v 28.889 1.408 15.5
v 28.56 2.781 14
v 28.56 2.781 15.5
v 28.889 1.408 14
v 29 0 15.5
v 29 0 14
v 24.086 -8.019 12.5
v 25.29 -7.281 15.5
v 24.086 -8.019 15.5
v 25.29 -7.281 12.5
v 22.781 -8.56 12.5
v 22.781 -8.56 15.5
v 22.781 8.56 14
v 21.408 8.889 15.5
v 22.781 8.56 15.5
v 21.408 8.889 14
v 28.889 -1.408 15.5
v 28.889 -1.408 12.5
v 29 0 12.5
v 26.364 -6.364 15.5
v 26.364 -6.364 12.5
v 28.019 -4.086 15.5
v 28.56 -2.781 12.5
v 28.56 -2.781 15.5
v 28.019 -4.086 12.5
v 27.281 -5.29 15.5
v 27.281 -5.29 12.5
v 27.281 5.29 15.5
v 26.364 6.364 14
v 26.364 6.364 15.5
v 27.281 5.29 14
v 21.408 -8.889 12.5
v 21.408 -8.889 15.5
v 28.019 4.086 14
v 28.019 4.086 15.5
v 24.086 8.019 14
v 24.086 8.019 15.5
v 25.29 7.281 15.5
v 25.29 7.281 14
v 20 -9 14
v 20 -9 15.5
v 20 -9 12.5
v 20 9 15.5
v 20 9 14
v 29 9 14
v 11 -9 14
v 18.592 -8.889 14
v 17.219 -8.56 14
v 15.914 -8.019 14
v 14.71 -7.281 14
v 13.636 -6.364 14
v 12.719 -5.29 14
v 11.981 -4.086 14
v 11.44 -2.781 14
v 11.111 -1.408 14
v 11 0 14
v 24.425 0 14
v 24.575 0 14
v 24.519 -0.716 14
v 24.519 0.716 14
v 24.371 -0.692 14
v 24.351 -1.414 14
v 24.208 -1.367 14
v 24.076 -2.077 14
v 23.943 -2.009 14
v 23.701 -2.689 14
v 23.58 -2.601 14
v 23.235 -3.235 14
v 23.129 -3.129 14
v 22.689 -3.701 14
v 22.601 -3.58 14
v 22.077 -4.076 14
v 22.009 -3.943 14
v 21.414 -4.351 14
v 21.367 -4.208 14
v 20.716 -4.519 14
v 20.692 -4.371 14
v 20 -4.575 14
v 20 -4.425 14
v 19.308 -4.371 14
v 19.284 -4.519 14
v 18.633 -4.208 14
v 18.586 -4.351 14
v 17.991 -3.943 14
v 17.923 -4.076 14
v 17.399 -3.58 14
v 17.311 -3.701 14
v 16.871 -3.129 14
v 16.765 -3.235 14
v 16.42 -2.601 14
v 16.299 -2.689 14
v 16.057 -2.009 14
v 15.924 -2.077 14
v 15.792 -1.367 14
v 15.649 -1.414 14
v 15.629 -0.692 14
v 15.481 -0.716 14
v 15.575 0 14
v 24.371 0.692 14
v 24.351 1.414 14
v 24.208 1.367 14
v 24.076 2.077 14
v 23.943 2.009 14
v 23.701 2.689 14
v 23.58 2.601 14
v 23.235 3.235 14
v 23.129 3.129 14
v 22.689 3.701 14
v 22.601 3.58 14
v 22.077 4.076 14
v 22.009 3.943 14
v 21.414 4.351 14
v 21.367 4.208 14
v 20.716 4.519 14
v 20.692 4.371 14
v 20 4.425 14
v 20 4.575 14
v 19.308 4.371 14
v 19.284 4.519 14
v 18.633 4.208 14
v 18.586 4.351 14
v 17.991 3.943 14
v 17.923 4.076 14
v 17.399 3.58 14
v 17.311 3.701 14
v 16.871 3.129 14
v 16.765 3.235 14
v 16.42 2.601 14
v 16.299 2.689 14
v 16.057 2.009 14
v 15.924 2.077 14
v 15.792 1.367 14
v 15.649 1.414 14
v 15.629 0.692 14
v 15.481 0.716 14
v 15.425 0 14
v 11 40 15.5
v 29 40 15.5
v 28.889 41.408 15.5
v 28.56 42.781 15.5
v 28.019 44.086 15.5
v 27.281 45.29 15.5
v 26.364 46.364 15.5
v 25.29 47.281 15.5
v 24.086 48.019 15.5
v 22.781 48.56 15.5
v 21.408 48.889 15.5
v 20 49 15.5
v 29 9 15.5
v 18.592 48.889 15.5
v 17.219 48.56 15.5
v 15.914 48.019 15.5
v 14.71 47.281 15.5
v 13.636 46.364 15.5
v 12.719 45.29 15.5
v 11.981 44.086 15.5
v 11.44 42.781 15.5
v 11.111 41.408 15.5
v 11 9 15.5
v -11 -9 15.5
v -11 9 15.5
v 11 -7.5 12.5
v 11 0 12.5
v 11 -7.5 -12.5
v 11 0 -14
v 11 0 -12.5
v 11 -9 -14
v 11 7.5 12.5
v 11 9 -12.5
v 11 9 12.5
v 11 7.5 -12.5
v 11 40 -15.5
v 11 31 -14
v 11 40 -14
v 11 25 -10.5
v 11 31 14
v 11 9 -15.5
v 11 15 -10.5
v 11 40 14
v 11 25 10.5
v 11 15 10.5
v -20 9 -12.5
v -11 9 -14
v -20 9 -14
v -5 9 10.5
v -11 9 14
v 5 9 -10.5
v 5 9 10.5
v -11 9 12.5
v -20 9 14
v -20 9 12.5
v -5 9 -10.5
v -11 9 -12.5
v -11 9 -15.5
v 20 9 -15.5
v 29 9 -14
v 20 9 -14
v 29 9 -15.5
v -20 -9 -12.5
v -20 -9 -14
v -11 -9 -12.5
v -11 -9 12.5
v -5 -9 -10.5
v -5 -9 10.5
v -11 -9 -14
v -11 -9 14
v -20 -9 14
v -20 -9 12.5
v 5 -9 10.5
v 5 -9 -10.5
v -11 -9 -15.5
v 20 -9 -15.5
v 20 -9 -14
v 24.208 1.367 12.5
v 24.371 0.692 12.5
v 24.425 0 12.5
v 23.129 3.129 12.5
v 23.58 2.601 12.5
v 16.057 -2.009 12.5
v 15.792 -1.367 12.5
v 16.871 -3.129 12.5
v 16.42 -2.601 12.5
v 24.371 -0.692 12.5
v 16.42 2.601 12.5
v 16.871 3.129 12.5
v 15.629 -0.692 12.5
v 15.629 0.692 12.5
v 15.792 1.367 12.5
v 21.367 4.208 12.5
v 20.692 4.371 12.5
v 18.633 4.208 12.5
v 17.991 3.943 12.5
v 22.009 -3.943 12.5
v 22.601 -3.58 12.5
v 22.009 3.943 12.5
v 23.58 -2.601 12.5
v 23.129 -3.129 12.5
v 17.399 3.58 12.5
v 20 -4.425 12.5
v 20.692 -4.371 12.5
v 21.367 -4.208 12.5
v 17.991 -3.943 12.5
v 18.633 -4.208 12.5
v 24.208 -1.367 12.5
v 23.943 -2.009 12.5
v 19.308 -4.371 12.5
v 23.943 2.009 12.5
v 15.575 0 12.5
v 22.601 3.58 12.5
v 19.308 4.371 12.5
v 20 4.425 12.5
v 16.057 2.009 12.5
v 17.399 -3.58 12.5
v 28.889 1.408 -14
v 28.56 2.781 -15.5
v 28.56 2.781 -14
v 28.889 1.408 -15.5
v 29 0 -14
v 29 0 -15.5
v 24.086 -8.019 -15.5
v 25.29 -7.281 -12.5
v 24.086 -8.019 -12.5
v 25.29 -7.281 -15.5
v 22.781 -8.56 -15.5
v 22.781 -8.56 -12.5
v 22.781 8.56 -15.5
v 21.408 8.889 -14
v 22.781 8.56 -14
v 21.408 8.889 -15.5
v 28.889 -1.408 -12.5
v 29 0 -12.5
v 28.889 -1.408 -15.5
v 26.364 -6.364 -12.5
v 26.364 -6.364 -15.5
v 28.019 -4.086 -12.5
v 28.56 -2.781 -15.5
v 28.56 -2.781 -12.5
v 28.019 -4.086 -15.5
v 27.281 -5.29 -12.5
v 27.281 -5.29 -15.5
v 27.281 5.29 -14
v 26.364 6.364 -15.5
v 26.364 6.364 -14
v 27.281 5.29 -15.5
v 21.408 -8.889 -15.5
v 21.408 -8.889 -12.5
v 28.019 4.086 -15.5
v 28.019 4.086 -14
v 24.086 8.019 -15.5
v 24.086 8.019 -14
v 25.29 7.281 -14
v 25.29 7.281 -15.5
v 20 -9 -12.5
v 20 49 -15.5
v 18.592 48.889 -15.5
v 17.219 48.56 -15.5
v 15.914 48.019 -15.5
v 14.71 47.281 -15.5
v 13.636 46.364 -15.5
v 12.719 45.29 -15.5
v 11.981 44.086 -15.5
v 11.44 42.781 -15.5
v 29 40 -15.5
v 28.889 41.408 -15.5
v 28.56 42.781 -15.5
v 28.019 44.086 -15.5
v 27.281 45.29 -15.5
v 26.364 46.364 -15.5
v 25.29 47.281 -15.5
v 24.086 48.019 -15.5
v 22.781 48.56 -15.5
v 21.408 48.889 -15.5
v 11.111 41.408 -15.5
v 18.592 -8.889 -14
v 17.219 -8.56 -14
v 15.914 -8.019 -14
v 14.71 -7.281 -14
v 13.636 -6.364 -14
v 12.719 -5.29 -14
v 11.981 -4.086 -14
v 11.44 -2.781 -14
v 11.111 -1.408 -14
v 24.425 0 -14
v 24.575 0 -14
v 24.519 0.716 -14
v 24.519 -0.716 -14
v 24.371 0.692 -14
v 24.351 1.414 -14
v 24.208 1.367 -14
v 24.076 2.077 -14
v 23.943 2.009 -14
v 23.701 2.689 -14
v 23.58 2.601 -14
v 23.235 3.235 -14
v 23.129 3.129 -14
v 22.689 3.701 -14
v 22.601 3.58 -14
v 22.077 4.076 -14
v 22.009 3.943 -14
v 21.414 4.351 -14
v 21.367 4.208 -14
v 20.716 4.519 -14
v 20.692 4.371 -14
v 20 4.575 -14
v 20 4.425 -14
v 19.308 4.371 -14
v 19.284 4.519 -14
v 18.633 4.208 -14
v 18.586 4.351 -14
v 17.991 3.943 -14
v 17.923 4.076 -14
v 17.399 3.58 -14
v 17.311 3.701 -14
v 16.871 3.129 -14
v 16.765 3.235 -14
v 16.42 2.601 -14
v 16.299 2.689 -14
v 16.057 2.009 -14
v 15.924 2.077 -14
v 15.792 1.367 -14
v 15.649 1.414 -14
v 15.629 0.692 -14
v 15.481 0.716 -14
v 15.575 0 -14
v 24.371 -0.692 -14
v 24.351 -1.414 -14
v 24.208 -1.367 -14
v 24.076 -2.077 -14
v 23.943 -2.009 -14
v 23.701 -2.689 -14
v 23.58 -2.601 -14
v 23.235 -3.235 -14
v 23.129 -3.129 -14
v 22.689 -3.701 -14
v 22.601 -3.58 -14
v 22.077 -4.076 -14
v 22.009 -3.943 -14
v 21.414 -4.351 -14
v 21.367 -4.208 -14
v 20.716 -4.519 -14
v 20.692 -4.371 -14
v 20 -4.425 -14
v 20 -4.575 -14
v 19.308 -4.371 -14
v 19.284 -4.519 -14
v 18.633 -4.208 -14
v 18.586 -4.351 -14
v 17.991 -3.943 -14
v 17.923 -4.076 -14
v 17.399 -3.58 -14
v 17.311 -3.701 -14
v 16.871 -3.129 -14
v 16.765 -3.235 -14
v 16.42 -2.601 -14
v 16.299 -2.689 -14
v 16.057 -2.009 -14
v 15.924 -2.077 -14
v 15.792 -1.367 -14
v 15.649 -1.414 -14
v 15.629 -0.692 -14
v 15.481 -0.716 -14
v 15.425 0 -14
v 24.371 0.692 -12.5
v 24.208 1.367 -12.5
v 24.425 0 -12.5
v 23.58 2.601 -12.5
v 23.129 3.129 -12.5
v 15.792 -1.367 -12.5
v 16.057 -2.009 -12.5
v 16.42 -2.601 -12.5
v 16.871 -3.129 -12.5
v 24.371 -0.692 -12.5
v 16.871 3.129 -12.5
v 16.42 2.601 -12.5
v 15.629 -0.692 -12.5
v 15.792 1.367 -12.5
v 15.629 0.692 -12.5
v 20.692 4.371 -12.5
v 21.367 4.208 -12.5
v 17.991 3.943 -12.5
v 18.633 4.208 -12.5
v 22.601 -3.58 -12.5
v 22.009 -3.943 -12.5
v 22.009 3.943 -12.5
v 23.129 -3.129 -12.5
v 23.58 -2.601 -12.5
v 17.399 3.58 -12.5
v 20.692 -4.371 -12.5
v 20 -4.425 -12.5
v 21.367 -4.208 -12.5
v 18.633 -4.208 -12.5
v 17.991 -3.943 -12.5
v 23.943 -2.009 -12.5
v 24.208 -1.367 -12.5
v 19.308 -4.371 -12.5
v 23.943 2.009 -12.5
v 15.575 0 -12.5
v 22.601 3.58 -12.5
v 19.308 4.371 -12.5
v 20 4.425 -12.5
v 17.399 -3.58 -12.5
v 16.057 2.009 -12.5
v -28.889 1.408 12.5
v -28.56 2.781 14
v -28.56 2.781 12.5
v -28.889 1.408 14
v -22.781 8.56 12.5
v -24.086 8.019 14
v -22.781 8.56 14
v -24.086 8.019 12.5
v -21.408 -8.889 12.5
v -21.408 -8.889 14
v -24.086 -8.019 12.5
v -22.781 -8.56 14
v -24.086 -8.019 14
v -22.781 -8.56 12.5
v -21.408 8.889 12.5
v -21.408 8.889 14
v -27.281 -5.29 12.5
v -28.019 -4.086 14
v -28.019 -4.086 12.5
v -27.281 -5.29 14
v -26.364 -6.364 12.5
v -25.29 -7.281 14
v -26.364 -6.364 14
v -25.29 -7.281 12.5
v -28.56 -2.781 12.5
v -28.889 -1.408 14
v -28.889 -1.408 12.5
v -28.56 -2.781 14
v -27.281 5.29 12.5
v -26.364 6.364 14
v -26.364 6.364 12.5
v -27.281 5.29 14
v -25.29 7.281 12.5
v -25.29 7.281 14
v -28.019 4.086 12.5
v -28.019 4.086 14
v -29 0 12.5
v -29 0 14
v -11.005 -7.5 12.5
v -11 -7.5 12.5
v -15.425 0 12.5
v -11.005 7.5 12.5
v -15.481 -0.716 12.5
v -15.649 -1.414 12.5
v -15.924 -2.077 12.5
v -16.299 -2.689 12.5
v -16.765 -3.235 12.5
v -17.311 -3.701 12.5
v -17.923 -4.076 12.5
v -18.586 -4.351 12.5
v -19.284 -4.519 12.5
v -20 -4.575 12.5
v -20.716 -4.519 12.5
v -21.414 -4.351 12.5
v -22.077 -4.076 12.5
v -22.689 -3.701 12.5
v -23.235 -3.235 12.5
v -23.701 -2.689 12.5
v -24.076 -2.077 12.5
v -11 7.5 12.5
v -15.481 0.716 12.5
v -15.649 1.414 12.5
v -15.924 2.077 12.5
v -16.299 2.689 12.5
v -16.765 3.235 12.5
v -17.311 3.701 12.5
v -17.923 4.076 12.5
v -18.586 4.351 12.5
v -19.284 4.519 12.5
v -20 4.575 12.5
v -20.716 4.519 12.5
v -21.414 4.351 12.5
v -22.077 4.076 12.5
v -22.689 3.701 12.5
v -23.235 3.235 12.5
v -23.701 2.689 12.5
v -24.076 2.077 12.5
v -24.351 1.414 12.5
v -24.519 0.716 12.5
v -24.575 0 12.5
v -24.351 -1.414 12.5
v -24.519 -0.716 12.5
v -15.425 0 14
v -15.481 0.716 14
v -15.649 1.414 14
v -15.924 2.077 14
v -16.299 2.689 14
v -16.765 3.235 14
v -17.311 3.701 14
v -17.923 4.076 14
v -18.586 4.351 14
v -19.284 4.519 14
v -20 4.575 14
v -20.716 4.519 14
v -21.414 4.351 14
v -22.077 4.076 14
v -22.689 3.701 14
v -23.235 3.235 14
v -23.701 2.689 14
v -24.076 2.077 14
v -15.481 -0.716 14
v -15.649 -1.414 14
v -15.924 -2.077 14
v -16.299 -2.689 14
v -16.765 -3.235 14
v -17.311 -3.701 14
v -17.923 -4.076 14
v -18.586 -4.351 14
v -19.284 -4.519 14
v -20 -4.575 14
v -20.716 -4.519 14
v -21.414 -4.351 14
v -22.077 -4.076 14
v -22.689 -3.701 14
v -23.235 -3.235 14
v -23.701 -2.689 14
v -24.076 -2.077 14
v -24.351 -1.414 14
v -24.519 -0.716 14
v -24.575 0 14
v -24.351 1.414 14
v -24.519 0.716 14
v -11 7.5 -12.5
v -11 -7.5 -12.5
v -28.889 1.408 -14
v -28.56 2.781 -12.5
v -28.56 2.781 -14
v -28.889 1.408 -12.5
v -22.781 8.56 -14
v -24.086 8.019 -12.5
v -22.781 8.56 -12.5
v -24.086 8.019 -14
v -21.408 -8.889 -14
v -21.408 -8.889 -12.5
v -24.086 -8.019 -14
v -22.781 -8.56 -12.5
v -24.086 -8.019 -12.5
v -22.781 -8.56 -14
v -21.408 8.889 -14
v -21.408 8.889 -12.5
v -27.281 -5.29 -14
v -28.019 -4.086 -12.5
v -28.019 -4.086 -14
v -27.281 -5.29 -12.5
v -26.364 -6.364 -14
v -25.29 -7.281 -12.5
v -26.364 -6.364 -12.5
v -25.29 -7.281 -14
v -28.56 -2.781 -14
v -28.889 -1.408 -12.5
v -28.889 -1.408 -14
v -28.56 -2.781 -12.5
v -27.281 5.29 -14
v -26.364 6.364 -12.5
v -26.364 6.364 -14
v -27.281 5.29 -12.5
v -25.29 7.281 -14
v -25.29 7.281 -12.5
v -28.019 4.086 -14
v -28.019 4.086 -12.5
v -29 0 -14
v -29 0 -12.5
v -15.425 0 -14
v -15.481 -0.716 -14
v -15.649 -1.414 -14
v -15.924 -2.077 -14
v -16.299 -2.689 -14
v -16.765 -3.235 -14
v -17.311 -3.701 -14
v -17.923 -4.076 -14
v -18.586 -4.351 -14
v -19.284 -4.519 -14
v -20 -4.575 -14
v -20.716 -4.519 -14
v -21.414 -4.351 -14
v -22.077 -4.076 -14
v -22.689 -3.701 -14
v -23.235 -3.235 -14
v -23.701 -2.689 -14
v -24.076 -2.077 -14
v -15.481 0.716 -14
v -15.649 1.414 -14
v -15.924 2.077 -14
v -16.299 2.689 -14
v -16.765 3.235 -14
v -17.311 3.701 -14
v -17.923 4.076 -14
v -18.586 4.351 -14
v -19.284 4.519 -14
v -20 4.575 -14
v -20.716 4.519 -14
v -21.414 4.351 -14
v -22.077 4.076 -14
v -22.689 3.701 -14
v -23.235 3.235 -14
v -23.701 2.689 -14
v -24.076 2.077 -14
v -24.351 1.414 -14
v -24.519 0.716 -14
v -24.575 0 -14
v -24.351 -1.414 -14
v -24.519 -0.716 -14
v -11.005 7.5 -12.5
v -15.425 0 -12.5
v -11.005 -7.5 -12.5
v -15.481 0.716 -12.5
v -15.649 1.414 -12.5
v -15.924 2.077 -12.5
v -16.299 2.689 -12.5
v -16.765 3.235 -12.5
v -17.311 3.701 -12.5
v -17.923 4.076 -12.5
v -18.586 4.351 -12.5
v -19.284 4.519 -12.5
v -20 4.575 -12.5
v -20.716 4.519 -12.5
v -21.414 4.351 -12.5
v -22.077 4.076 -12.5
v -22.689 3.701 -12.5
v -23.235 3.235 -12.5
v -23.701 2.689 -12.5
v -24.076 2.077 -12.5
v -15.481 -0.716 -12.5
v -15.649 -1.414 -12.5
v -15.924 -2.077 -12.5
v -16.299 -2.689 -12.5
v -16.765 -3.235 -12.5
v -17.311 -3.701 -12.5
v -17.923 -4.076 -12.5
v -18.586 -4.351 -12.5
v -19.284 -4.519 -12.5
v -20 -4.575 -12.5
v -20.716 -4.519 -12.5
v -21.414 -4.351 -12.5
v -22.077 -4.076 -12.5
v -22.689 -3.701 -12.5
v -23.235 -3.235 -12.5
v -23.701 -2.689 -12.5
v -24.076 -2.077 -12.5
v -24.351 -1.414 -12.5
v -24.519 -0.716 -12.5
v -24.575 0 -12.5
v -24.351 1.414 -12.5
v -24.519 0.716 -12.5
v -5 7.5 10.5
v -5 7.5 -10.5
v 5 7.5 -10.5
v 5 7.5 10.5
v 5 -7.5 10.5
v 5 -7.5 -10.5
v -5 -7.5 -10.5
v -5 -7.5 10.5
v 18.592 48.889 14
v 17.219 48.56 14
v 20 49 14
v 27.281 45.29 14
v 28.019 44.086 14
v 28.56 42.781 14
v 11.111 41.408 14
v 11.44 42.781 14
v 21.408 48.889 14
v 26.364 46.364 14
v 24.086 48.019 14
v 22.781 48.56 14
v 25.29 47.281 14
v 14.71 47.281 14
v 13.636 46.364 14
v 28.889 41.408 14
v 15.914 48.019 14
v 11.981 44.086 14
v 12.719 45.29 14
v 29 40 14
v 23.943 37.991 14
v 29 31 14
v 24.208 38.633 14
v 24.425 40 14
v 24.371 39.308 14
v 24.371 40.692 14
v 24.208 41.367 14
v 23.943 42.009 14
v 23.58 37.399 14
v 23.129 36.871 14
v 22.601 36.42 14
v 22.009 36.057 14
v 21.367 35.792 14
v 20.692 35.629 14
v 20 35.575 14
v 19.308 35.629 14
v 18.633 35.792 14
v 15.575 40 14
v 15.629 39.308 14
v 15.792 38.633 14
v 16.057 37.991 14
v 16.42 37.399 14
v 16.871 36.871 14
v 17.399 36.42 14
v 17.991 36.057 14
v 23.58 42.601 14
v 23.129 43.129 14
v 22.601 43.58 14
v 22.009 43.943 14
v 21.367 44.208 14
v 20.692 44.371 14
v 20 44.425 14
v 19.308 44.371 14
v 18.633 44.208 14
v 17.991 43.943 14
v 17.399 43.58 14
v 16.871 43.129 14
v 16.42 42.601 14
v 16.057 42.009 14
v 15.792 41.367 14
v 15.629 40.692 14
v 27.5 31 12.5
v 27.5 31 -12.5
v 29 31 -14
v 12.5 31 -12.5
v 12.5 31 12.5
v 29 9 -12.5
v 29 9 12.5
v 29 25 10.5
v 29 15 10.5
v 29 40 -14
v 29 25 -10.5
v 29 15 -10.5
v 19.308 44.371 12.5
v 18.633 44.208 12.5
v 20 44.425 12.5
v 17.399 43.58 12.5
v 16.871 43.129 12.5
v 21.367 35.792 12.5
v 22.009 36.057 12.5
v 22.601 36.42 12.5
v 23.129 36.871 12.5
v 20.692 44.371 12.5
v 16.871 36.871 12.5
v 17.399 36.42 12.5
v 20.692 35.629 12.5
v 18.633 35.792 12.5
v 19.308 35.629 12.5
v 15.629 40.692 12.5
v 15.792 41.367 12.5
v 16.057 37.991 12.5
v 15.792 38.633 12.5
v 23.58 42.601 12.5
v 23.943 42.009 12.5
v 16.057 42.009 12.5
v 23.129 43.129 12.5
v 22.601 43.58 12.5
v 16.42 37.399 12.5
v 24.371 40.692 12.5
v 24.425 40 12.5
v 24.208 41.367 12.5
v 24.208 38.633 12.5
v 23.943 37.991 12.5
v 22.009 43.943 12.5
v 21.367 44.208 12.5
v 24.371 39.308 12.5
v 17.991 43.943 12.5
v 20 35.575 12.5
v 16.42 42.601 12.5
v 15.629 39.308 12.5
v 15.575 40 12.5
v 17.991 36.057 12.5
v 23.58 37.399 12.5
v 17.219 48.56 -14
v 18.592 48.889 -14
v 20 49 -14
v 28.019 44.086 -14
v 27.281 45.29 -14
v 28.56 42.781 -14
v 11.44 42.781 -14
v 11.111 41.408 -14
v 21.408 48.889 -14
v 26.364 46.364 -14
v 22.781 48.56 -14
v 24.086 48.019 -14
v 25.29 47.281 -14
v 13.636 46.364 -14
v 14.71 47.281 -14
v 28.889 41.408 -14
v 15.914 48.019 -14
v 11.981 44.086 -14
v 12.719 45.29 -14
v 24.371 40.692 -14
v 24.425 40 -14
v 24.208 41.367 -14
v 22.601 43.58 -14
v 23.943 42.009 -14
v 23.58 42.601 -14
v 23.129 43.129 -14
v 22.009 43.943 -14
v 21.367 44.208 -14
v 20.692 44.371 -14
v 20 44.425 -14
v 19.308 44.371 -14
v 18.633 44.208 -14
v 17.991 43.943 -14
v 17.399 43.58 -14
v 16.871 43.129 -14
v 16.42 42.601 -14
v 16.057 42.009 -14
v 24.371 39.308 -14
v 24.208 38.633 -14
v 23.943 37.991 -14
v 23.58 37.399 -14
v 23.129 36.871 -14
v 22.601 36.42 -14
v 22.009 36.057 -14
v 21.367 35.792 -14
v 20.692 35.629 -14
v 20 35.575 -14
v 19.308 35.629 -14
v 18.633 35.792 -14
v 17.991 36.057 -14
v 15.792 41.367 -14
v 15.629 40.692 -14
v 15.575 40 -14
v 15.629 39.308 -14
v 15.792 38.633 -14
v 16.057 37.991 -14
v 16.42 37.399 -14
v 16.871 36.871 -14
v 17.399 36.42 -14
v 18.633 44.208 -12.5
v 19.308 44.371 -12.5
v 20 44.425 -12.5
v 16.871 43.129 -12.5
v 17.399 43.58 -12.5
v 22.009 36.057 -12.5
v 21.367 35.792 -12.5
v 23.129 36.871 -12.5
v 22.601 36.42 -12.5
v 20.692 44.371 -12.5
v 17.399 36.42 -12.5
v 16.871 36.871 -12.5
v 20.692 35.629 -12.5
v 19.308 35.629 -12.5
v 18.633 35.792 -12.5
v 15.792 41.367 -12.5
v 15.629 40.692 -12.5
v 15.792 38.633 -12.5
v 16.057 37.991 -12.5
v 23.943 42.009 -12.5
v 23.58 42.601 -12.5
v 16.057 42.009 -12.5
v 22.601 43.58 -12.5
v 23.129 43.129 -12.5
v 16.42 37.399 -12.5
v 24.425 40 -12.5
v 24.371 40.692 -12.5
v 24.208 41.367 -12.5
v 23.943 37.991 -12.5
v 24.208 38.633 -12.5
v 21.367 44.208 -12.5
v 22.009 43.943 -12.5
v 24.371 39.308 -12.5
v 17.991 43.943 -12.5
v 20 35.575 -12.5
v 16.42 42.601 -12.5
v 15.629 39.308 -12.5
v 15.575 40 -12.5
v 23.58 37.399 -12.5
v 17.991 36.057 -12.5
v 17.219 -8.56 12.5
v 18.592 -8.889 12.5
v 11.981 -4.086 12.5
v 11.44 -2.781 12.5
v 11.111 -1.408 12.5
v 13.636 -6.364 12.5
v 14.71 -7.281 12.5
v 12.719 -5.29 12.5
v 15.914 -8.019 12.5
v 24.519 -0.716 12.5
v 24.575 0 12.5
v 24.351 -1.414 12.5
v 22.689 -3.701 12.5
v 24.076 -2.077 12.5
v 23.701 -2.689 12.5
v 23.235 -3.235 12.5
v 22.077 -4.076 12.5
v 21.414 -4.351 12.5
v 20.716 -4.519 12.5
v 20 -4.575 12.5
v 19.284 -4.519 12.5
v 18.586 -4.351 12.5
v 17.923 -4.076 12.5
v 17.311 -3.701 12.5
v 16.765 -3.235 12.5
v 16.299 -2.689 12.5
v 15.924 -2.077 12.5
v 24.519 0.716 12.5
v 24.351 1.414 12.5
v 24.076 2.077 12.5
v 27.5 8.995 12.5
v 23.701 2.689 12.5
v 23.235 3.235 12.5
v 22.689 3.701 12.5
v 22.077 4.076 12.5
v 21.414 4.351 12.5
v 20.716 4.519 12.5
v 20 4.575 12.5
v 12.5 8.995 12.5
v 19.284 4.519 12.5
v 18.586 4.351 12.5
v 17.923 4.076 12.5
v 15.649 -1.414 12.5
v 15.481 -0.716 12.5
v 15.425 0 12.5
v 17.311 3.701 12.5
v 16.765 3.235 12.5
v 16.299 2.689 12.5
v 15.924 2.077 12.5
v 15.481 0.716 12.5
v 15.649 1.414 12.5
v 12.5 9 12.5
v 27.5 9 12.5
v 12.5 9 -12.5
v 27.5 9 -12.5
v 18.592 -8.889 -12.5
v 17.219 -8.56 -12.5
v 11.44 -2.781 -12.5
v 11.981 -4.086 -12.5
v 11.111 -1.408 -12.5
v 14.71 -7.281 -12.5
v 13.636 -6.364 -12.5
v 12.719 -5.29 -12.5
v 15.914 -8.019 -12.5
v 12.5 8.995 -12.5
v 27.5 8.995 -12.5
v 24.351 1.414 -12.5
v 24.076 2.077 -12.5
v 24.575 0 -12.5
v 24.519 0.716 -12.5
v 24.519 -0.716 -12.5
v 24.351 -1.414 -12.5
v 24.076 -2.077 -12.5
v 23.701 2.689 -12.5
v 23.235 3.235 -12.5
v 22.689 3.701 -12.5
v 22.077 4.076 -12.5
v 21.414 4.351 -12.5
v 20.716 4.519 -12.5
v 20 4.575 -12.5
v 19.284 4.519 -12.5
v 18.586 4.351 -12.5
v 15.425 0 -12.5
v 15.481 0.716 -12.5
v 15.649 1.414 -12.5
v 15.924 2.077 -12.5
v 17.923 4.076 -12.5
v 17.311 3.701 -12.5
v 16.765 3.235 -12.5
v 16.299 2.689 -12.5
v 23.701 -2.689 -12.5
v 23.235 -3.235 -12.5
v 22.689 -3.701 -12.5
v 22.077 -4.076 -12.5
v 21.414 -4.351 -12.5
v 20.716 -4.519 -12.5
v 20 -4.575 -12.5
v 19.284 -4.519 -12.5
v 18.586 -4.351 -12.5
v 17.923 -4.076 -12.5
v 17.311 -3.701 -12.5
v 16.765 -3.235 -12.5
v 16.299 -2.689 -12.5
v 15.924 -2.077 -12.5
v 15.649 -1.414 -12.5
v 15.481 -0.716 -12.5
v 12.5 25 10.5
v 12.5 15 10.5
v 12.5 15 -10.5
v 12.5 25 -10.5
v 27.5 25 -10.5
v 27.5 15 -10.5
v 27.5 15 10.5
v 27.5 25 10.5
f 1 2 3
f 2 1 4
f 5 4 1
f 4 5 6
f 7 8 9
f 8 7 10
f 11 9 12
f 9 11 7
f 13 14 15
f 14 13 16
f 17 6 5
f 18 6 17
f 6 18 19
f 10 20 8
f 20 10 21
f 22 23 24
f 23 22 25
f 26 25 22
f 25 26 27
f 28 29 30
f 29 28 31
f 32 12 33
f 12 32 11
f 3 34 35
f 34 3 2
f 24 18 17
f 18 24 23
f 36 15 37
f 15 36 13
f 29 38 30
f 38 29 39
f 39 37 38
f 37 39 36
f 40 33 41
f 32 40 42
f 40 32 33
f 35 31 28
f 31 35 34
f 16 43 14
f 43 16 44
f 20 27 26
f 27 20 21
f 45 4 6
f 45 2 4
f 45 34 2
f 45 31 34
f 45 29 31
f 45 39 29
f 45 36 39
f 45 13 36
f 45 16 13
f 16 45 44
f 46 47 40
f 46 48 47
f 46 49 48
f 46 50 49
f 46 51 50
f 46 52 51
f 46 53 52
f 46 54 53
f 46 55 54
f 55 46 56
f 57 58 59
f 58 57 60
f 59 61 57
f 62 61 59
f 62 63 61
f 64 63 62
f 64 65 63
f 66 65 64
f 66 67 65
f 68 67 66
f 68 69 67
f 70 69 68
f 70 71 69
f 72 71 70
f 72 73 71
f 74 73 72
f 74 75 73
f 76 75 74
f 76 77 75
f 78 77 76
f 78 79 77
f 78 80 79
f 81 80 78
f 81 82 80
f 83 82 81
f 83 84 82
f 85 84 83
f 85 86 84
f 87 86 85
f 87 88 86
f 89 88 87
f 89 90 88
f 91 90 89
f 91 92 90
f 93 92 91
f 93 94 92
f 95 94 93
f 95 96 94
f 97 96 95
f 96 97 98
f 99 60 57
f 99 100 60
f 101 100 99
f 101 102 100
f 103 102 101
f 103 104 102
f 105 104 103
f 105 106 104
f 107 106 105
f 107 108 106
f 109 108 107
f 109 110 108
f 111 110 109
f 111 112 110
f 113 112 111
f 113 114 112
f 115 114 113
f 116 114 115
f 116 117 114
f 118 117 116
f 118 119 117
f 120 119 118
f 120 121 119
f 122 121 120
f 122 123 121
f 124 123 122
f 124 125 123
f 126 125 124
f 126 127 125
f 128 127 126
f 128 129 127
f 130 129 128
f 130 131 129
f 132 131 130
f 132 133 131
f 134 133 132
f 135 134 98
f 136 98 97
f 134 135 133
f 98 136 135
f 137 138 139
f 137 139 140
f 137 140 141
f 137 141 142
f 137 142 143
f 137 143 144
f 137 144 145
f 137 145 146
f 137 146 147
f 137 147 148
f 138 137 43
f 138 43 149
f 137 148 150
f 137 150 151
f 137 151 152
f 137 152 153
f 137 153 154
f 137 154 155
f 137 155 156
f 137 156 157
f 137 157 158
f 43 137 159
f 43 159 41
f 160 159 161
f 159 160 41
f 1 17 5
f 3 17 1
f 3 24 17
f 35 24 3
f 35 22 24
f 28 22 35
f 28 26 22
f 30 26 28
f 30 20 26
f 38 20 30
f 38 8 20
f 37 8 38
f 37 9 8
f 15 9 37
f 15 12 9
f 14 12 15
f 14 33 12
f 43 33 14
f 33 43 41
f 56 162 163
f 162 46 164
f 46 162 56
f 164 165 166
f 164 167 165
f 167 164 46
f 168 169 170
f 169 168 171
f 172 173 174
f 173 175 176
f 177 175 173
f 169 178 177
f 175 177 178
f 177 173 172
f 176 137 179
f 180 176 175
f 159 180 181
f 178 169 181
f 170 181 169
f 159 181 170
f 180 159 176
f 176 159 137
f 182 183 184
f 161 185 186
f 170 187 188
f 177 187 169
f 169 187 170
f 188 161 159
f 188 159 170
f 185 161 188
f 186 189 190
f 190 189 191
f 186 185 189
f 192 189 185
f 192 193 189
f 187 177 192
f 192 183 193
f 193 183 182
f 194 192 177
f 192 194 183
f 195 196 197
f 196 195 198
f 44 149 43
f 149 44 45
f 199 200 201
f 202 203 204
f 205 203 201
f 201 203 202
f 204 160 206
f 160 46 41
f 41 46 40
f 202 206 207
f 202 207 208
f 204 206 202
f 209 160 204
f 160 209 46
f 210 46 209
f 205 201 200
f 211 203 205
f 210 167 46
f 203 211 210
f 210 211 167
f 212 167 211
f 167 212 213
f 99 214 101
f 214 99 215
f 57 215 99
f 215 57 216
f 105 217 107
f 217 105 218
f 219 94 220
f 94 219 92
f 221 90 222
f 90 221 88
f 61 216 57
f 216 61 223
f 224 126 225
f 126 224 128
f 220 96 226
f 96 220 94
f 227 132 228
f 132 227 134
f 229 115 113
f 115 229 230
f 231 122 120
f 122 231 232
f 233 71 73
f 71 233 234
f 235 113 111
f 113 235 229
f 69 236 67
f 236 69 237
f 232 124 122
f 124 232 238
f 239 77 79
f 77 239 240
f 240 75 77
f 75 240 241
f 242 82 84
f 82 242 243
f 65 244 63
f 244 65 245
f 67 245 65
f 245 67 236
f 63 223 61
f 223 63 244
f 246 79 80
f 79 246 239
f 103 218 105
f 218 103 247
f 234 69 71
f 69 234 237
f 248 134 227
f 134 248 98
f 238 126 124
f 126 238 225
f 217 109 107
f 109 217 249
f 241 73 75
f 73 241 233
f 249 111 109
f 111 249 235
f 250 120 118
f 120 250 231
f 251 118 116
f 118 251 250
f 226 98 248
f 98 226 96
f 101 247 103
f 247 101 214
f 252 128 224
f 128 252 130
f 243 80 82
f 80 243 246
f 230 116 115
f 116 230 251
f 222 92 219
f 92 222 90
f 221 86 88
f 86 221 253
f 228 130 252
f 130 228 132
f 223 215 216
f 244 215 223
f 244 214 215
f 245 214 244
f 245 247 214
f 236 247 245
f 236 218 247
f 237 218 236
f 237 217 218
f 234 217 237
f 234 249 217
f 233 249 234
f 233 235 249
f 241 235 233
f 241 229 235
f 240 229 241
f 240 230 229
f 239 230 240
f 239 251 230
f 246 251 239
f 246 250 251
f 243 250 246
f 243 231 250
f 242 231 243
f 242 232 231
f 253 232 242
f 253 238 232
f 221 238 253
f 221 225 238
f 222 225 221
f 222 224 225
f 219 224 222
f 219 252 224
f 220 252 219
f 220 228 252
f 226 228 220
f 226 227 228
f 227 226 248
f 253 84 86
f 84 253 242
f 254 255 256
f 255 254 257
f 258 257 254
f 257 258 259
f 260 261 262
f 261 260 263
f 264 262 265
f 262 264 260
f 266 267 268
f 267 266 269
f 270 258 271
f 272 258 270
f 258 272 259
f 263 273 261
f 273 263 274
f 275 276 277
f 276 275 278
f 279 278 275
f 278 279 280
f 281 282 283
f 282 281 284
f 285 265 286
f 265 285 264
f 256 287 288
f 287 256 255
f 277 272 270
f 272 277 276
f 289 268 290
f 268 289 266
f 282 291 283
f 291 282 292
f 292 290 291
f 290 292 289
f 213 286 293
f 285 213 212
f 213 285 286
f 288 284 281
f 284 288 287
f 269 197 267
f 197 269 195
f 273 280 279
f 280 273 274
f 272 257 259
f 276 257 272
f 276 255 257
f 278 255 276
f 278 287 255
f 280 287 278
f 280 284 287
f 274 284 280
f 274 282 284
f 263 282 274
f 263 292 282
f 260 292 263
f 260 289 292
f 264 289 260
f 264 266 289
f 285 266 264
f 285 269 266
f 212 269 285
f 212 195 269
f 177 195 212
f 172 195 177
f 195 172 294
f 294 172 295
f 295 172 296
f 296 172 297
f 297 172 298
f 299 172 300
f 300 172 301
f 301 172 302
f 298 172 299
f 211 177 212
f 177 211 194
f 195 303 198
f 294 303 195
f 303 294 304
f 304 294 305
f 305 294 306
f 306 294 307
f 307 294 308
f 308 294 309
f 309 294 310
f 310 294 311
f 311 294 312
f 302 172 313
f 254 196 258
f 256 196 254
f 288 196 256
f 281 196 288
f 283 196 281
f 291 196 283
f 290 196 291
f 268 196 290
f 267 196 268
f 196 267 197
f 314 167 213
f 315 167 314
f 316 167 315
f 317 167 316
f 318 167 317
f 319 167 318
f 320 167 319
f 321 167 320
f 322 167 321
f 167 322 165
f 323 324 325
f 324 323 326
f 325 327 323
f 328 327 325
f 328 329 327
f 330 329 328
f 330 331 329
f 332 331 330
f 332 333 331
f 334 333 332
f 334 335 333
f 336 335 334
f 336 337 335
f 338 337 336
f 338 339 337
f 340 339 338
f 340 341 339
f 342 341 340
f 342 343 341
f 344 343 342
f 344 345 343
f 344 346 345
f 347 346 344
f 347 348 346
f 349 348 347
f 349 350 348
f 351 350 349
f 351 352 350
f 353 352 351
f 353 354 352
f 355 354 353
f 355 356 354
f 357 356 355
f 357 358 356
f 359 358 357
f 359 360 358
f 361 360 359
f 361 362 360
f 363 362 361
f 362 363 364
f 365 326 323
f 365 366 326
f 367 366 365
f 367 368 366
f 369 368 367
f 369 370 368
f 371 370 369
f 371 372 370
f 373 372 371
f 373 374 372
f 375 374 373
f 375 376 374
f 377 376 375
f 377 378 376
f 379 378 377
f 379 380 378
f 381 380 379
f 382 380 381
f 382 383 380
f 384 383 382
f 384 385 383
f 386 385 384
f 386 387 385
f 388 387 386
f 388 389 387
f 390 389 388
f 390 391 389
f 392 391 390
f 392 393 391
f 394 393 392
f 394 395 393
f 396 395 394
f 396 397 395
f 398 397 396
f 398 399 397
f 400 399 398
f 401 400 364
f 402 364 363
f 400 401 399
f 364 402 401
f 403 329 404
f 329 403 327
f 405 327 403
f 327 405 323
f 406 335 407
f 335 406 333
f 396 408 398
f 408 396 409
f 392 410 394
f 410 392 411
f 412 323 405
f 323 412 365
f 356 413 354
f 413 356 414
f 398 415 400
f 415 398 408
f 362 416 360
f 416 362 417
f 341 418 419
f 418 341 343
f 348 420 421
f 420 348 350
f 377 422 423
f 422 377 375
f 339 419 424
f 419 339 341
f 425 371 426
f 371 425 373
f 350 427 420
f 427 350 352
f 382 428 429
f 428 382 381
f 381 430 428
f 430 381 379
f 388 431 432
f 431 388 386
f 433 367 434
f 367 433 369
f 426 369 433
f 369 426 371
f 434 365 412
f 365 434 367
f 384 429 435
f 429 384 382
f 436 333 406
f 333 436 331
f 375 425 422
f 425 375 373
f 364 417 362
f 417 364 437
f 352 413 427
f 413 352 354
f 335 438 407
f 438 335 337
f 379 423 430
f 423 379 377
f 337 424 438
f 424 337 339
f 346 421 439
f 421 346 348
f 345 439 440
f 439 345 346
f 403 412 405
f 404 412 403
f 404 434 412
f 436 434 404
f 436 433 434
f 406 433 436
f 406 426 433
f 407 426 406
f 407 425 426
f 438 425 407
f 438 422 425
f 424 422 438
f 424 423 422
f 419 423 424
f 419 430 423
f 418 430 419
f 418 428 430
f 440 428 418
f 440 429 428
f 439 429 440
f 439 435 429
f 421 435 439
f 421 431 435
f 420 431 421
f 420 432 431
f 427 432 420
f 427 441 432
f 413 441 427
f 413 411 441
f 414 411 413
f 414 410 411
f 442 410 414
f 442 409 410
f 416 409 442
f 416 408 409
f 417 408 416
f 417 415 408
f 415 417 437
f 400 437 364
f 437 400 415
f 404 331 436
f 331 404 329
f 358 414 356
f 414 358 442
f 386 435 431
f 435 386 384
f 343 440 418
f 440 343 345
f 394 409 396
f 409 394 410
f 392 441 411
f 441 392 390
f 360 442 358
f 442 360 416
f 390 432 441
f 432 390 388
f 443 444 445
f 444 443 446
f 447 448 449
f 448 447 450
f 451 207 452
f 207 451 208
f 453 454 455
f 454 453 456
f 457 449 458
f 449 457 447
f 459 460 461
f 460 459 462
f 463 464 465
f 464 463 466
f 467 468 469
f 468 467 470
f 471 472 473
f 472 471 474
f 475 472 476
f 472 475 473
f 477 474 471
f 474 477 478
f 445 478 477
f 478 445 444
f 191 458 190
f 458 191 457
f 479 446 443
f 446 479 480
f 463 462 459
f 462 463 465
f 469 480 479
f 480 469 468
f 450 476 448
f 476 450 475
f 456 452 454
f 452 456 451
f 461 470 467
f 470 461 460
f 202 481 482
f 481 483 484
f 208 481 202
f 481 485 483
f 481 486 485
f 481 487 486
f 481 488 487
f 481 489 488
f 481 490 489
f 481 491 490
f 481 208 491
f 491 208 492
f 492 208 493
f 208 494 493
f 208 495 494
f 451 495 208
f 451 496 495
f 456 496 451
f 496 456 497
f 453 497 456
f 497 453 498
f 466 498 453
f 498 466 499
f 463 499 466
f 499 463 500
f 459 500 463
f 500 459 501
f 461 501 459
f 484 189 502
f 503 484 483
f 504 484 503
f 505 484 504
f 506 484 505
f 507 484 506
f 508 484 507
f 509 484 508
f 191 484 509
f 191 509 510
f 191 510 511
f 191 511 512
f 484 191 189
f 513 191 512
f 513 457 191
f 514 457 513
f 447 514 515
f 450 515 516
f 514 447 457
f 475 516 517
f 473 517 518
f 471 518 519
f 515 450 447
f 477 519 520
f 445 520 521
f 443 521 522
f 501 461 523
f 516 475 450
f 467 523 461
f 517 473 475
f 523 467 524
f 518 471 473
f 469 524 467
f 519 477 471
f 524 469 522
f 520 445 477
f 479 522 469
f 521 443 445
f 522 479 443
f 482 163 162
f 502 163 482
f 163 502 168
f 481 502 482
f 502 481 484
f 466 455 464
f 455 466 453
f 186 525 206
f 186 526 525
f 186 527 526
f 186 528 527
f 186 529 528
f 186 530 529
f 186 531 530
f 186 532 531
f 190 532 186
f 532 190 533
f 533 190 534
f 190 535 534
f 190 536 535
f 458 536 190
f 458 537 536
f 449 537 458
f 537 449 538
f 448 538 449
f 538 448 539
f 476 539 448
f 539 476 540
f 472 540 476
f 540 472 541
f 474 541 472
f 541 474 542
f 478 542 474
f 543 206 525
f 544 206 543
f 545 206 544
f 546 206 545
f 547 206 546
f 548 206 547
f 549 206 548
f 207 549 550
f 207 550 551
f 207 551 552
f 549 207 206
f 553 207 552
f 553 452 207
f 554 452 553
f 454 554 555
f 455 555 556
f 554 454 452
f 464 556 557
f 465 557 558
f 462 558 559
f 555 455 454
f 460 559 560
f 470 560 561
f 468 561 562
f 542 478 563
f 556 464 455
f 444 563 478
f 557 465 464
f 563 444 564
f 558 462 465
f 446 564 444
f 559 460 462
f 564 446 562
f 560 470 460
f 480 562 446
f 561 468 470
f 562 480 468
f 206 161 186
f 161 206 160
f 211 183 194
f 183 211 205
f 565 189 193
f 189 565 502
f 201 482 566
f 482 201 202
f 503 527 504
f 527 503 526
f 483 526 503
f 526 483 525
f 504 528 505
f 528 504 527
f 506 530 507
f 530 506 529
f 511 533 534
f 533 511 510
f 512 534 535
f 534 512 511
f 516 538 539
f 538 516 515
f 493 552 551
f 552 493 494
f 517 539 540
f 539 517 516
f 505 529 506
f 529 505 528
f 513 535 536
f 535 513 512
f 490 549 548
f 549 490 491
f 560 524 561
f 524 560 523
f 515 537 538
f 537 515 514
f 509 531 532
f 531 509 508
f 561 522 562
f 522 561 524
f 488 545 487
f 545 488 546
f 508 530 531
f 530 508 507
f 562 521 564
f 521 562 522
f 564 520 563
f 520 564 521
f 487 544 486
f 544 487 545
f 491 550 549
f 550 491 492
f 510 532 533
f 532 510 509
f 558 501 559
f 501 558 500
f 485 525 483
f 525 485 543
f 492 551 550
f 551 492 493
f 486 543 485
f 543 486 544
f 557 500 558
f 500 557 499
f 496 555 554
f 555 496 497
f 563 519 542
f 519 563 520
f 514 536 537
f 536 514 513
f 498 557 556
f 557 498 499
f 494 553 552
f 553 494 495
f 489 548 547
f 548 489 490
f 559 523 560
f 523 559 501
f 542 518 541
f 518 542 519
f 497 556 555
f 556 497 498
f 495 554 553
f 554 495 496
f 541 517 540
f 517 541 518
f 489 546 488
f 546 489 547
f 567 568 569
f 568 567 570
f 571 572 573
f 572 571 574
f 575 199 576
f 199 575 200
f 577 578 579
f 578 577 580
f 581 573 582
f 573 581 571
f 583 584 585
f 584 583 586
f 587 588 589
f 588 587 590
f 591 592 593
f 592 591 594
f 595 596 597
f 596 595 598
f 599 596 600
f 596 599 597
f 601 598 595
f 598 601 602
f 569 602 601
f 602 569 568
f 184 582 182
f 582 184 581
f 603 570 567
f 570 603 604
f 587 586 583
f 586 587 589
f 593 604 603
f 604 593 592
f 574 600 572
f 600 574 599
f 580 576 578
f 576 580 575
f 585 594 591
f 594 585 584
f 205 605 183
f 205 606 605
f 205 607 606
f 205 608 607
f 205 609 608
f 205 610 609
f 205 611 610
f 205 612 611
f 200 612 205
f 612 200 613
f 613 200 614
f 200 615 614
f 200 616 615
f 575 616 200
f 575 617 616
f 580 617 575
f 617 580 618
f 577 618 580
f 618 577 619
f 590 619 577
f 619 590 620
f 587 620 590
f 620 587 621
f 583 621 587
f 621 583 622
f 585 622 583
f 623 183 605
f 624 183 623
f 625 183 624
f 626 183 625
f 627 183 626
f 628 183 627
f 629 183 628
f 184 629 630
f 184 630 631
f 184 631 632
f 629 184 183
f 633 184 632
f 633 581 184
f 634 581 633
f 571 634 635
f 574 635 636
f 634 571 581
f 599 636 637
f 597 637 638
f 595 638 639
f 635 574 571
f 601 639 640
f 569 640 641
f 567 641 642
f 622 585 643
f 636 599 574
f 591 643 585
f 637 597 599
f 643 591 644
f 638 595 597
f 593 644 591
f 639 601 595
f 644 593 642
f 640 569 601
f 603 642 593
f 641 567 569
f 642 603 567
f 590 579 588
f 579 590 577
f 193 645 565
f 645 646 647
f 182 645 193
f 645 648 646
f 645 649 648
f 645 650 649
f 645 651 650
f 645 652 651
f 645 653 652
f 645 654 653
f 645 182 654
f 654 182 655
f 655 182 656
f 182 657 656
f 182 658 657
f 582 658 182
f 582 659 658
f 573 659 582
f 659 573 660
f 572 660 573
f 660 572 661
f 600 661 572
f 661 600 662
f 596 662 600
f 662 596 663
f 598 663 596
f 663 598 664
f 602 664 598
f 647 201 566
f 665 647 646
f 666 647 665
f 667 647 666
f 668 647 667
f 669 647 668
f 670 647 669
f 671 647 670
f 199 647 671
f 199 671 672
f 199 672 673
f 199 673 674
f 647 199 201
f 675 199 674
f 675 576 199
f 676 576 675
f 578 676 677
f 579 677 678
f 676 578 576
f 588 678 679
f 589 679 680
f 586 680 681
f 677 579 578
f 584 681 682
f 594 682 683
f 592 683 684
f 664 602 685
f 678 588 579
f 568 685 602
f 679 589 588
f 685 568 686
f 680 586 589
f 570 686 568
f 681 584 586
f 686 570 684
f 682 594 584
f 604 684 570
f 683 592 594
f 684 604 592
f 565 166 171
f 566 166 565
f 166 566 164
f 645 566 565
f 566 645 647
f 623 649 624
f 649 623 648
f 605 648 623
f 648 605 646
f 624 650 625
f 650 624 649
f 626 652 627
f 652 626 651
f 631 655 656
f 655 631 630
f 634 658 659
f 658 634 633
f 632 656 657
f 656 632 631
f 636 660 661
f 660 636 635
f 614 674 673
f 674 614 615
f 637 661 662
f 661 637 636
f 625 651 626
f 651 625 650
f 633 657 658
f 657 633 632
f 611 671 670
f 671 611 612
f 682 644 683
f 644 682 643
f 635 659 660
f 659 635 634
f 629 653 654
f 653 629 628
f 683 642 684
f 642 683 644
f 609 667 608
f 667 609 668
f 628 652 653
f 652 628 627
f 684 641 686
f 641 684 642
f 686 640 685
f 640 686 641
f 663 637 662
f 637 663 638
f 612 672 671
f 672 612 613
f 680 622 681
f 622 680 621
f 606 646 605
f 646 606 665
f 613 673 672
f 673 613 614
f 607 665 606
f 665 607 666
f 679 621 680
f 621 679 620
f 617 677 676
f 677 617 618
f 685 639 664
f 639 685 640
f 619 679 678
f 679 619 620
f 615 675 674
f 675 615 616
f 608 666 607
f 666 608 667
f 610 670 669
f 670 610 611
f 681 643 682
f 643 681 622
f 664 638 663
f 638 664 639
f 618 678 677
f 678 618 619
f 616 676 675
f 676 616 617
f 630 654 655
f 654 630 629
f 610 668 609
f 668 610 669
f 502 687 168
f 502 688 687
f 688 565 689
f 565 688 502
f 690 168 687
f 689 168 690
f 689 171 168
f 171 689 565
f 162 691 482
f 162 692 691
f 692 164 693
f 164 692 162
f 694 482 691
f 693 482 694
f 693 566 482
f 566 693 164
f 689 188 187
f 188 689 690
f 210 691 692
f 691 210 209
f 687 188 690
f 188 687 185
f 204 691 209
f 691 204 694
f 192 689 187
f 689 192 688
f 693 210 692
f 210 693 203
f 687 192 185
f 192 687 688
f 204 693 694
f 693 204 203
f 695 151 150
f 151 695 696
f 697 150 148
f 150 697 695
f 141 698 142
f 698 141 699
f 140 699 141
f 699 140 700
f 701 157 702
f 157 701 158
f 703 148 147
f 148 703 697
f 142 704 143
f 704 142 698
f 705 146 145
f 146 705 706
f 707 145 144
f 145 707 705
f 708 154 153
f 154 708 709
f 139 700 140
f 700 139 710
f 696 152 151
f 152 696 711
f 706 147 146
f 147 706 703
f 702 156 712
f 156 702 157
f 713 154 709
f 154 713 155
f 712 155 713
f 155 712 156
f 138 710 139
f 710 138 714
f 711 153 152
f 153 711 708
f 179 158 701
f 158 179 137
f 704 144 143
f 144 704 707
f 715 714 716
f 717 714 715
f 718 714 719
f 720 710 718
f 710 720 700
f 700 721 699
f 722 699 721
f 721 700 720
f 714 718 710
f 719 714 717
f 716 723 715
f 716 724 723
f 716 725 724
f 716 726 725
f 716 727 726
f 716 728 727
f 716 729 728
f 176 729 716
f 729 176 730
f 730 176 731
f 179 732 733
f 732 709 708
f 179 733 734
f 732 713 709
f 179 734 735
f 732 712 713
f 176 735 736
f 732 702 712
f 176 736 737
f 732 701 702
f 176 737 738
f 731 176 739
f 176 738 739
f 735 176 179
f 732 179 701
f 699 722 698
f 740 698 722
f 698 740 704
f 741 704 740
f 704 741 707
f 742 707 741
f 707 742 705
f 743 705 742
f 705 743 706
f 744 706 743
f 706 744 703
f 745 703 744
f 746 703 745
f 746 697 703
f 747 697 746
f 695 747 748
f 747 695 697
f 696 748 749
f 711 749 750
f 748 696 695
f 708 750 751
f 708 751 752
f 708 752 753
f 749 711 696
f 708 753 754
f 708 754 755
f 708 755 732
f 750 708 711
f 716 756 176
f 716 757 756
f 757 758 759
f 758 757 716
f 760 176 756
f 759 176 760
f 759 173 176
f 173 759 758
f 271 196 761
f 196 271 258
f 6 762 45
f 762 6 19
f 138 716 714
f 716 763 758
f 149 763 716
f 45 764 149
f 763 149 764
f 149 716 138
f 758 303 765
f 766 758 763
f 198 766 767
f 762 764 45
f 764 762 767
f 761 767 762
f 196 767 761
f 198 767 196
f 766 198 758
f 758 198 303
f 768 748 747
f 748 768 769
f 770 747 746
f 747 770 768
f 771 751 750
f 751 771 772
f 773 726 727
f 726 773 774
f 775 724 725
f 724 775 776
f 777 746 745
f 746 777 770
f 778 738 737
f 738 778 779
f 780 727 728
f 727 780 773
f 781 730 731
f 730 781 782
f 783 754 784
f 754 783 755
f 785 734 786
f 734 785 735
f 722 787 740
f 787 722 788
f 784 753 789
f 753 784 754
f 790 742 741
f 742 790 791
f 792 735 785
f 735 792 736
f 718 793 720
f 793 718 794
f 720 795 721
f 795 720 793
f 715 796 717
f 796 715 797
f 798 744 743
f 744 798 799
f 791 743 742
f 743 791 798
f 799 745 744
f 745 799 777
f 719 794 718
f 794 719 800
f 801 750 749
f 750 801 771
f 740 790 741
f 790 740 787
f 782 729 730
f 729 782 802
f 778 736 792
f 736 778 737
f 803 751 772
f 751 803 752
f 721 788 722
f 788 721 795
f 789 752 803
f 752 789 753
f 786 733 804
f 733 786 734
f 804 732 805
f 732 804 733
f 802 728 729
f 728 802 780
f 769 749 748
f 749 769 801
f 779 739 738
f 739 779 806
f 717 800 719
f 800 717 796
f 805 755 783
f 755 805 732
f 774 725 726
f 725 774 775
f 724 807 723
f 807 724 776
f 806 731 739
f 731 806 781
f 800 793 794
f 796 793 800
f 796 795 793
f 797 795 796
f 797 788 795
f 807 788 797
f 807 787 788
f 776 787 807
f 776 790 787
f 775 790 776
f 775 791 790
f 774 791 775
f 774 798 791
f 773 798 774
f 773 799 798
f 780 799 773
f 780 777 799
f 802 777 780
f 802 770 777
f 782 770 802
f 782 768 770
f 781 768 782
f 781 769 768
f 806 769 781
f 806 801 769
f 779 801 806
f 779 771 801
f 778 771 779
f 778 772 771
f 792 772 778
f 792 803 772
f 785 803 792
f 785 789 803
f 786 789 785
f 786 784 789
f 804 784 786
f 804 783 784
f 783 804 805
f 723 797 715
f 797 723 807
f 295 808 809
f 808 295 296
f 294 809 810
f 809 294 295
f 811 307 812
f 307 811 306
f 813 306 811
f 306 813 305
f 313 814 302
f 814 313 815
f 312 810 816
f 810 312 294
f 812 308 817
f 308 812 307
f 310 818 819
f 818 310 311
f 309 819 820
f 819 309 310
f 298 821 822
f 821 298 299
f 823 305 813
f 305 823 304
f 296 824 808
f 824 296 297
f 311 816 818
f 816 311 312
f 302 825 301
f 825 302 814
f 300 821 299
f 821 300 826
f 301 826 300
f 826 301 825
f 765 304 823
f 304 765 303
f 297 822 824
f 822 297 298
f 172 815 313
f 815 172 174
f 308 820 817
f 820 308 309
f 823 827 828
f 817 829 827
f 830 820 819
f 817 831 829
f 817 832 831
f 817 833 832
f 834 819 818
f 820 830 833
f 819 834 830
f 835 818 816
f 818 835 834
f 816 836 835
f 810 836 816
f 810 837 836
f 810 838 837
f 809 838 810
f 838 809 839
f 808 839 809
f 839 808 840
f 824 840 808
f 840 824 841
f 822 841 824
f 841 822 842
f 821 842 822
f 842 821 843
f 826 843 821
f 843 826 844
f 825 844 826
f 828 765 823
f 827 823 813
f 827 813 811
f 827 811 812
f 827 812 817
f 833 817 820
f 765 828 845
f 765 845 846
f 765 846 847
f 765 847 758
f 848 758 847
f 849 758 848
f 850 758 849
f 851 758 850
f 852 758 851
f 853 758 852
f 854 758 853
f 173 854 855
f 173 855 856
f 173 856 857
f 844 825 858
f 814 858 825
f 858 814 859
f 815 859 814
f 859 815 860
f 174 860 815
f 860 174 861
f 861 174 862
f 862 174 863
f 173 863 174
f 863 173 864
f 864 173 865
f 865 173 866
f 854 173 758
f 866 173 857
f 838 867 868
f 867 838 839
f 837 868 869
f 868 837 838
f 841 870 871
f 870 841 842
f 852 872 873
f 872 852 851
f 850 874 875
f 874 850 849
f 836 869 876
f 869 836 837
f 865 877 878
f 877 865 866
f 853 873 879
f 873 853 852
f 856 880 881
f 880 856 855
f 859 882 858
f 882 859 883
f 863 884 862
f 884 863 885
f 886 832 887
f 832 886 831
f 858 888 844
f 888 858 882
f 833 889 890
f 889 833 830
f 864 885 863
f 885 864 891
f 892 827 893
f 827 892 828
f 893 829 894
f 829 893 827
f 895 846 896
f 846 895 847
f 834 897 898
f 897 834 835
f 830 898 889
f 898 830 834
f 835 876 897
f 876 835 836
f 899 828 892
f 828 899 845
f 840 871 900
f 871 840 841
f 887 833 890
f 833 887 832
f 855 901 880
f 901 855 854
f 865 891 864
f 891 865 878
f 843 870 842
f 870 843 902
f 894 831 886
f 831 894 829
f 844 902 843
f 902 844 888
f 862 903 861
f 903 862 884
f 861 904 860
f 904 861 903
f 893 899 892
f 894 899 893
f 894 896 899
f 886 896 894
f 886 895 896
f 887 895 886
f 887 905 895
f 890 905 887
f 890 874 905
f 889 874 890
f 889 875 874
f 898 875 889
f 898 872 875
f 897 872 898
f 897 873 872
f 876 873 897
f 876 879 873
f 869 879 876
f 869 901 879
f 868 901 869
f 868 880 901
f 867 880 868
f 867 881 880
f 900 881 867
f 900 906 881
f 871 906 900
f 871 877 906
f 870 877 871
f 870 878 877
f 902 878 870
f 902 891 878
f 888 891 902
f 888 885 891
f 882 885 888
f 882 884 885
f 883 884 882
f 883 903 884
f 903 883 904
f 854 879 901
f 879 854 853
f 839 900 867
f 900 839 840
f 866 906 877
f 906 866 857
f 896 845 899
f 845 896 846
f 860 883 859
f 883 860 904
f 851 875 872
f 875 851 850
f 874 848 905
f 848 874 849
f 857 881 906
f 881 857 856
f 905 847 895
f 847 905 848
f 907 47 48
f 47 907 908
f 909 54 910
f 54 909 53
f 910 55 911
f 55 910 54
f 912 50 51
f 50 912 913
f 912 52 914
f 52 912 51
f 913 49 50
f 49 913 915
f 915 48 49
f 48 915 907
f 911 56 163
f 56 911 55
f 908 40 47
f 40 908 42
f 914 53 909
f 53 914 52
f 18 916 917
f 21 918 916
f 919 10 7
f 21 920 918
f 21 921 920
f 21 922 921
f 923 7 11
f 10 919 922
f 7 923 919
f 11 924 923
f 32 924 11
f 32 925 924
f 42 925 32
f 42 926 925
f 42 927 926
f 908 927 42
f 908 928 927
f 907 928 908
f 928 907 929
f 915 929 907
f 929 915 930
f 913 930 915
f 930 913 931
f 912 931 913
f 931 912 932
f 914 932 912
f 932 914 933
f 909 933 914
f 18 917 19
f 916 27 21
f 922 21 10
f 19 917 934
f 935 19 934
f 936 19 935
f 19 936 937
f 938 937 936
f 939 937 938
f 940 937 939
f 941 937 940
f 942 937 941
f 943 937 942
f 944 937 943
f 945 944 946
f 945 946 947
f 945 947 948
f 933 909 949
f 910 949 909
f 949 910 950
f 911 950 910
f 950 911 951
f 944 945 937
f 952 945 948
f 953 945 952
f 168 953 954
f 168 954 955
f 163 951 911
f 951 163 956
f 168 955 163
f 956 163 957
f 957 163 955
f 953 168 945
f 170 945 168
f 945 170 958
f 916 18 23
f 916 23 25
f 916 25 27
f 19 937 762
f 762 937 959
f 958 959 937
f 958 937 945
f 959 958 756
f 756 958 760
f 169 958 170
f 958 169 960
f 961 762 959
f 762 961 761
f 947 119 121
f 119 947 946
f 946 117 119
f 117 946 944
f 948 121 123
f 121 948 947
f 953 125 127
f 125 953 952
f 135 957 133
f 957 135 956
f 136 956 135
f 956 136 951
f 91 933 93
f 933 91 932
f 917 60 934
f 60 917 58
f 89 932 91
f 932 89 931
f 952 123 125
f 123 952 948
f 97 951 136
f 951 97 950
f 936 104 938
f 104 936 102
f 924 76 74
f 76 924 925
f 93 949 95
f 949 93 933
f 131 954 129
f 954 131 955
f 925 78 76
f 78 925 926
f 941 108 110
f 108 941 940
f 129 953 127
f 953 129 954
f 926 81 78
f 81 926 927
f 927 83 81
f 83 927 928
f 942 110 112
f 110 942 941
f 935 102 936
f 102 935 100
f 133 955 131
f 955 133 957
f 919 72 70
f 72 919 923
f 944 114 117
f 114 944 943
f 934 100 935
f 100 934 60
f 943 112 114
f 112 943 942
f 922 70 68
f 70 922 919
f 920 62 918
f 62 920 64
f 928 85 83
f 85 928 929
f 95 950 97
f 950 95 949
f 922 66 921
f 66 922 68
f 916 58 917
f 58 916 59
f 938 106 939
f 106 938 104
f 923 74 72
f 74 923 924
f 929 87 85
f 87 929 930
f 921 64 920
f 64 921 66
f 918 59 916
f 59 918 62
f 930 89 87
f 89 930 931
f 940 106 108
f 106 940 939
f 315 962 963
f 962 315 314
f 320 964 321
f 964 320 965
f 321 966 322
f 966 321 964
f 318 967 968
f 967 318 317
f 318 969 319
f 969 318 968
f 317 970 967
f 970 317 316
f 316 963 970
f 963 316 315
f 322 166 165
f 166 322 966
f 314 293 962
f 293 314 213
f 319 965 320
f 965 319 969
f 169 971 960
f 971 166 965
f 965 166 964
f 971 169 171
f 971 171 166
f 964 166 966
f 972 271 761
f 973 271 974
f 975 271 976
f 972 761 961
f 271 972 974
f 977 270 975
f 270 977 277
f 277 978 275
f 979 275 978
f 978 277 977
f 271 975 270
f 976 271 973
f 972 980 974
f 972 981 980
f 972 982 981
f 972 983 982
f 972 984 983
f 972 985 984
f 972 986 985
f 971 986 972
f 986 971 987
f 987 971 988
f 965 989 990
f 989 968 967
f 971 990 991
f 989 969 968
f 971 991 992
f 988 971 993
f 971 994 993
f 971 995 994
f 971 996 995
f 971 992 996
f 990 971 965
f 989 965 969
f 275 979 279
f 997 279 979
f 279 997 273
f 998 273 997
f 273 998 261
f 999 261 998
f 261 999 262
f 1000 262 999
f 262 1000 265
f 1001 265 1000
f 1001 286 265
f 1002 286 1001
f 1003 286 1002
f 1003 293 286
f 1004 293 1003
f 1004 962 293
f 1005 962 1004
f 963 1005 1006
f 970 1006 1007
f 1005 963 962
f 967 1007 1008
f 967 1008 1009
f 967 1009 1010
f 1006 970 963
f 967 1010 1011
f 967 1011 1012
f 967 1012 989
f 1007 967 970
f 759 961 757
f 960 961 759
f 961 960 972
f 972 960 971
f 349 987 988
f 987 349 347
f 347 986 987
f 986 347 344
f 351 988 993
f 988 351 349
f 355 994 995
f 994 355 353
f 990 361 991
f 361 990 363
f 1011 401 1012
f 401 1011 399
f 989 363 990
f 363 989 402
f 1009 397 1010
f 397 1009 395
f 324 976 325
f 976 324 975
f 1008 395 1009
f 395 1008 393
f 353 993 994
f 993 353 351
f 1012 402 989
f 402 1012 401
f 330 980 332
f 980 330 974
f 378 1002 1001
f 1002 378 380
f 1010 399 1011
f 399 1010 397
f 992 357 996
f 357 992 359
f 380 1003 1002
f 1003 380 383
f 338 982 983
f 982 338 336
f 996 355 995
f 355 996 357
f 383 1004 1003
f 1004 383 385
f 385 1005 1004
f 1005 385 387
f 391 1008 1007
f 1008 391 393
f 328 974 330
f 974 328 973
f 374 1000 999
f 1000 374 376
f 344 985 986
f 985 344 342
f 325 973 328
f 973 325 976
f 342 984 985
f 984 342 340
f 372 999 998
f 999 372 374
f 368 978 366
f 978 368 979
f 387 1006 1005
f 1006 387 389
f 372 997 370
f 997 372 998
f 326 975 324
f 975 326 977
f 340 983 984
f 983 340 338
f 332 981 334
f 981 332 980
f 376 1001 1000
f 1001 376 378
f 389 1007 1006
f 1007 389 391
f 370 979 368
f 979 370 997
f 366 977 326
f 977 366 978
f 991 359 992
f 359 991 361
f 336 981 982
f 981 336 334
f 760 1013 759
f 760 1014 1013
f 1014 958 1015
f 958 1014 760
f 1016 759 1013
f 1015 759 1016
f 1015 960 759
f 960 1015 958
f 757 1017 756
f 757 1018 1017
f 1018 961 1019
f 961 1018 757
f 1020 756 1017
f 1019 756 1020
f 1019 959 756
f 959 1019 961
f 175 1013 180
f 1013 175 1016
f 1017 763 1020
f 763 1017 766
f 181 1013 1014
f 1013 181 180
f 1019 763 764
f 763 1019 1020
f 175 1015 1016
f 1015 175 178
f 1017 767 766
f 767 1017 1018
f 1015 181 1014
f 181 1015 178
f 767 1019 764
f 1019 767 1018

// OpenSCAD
$fn = 40;

cable_chain_in_x_total = 40;
cable_chain_in_y = 15;
cable_chain_in_z = 25;

cable_chain_thickness_y = 1.5;
cable_chain_thickness_z = 3;

cable_chain_in_x = cable_chain_in_x_total - cable_chain_in_y - (cable_chain_thickness_y * 2);

cable_chain_out_x = cable_chain_in_x;
cable_chain_out_y = cable_chain_in_y + cable_chain_thickness_y * 2;
cable_chain_out_z = cable_chain_in_z + cable_chain_thickness_z * 2;


cable_chaine_clip_radius_in = cable_chain_out_y / 4;
cable_chaine_clip_margin = 0.3;


cable_chaine_clip_radius_out = (cable_chain_out_y / 2);
cable_chain_clip_z = (cable_chain_thickness_z / 2);
	
cable_chain_clip_x_offset = (cable_chain_out_x / 2) + (cable_chain_out_y / 2);
cable_chain_clip_z_offset = (cable_chain_out_z / 2) - cable_chain_clip_z;


cable_chain_lighter_margin_x = 6;
cable_chain_lighter_margin_z = 2;

module cable_chain_clip_male(pos_z) {

	translate([cable_chain_clip_x_offset, 0, cable_chain_clip_z_offset * pos_z])
	union() {
		translate([0, 0, (cable_chain_clip_z / 2) * pos_z])
		cylinder(r=cable_chaine_clip_radius_out, h=cable_chain_clip_z , center=true);
		
		translate([-(cable_chain_out_y / 4), 0, (cable_chain_clip_z / 2) * pos_z])
		cube([cable_chain_out_y / 2, cable_chain_out_y, cable_chain_clip_z], center = true);
		
		translate([0, 0, -(cable_chain_clip_z / 2) * pos_z])
		cylinder(r=cable_chaine_clip_radius_in - (cable_chaine_clip_margin / 4), h=cable_chain_clip_z , center=true);
	}
}
// cable_chain_clip_male


module cable_chain_clip_female(pos_z) {
	translate([-cable_chain_clip_x_offset, 0, cable_chain_clip_z_offset * pos_z])
	difference() {
		union() {
			translate([0, 0, -(cable_chain_clip_z / 2) * pos_z])
			cylinder(r=cable_chaine_clip_radius_out, h=cable_chain_clip_z , center=true);
			
			translate([(cable_chain_out_y / 4), 0, -(cable_chain_clip_z / 2) * pos_z])
			cube([cable_chain_out_y / 2, cable_chain_out_y, cable_chain_clip_z], center = true);
		}
		
		translate([0, 0, -(cable_chain_clip_z / 2) * pos_z])
			cylinder(r=cable_chaine_clip_radius_in + (cable_chaine_clip_margin / 4), h=cable_chain_clip_z * 2 , center=true);
	}
}
// cable_chain_clip_female



module cable_chain_clip() {
	cable_chain_clip_male(+1);
	cable_chain_clip_male(-1);
	cable_chain_clip_female(+1);
	cable_chain_clip_female(-1);
}
// cable_chain_clip



module cable_chain_out() {
	cube([cable_chain_out_x, cable_chain_out_y, cable_chain_out_z], center = true);
}

// cable_chain_out

module cable_chain_in() {
	cube([cable_chain_in_x + 0.01, cable_chain_in_y, cable_chain_in_z], center = true);
}
// cable_chain_in

module cable_chain_lighter() {
	cable_chain_lighter_x = cable_chain_out_x - (cable_chain_lighter_margin_x * 2);
	cable_chain_lighter_y = cable_chain_out_y * 2;
	
	cable_chain_lighter_z = cable_chain_in_z - (cable_chain_lighter_margin_z * 2);
	cube([cable_chain_lighter_x, cable_chain_lighter_y, cable_chain_lighter_z], center = true);
}
// cable_chain_lighter


module cable_chain() {
	
	
	
	difference() {
		union() {
			cable_chain_out();
			cable_chain_clip();
		}
		
		cable_chain_in();
		cable_chain_lighter();
	}
}


cable_chain();


offset_chain = (cable_chain_out_x / 2) + (cable_chain_out_y / 2);

translate([offset_chain, offset_chain, 0])
rotate([0, 0, 90])
cable_chain();
